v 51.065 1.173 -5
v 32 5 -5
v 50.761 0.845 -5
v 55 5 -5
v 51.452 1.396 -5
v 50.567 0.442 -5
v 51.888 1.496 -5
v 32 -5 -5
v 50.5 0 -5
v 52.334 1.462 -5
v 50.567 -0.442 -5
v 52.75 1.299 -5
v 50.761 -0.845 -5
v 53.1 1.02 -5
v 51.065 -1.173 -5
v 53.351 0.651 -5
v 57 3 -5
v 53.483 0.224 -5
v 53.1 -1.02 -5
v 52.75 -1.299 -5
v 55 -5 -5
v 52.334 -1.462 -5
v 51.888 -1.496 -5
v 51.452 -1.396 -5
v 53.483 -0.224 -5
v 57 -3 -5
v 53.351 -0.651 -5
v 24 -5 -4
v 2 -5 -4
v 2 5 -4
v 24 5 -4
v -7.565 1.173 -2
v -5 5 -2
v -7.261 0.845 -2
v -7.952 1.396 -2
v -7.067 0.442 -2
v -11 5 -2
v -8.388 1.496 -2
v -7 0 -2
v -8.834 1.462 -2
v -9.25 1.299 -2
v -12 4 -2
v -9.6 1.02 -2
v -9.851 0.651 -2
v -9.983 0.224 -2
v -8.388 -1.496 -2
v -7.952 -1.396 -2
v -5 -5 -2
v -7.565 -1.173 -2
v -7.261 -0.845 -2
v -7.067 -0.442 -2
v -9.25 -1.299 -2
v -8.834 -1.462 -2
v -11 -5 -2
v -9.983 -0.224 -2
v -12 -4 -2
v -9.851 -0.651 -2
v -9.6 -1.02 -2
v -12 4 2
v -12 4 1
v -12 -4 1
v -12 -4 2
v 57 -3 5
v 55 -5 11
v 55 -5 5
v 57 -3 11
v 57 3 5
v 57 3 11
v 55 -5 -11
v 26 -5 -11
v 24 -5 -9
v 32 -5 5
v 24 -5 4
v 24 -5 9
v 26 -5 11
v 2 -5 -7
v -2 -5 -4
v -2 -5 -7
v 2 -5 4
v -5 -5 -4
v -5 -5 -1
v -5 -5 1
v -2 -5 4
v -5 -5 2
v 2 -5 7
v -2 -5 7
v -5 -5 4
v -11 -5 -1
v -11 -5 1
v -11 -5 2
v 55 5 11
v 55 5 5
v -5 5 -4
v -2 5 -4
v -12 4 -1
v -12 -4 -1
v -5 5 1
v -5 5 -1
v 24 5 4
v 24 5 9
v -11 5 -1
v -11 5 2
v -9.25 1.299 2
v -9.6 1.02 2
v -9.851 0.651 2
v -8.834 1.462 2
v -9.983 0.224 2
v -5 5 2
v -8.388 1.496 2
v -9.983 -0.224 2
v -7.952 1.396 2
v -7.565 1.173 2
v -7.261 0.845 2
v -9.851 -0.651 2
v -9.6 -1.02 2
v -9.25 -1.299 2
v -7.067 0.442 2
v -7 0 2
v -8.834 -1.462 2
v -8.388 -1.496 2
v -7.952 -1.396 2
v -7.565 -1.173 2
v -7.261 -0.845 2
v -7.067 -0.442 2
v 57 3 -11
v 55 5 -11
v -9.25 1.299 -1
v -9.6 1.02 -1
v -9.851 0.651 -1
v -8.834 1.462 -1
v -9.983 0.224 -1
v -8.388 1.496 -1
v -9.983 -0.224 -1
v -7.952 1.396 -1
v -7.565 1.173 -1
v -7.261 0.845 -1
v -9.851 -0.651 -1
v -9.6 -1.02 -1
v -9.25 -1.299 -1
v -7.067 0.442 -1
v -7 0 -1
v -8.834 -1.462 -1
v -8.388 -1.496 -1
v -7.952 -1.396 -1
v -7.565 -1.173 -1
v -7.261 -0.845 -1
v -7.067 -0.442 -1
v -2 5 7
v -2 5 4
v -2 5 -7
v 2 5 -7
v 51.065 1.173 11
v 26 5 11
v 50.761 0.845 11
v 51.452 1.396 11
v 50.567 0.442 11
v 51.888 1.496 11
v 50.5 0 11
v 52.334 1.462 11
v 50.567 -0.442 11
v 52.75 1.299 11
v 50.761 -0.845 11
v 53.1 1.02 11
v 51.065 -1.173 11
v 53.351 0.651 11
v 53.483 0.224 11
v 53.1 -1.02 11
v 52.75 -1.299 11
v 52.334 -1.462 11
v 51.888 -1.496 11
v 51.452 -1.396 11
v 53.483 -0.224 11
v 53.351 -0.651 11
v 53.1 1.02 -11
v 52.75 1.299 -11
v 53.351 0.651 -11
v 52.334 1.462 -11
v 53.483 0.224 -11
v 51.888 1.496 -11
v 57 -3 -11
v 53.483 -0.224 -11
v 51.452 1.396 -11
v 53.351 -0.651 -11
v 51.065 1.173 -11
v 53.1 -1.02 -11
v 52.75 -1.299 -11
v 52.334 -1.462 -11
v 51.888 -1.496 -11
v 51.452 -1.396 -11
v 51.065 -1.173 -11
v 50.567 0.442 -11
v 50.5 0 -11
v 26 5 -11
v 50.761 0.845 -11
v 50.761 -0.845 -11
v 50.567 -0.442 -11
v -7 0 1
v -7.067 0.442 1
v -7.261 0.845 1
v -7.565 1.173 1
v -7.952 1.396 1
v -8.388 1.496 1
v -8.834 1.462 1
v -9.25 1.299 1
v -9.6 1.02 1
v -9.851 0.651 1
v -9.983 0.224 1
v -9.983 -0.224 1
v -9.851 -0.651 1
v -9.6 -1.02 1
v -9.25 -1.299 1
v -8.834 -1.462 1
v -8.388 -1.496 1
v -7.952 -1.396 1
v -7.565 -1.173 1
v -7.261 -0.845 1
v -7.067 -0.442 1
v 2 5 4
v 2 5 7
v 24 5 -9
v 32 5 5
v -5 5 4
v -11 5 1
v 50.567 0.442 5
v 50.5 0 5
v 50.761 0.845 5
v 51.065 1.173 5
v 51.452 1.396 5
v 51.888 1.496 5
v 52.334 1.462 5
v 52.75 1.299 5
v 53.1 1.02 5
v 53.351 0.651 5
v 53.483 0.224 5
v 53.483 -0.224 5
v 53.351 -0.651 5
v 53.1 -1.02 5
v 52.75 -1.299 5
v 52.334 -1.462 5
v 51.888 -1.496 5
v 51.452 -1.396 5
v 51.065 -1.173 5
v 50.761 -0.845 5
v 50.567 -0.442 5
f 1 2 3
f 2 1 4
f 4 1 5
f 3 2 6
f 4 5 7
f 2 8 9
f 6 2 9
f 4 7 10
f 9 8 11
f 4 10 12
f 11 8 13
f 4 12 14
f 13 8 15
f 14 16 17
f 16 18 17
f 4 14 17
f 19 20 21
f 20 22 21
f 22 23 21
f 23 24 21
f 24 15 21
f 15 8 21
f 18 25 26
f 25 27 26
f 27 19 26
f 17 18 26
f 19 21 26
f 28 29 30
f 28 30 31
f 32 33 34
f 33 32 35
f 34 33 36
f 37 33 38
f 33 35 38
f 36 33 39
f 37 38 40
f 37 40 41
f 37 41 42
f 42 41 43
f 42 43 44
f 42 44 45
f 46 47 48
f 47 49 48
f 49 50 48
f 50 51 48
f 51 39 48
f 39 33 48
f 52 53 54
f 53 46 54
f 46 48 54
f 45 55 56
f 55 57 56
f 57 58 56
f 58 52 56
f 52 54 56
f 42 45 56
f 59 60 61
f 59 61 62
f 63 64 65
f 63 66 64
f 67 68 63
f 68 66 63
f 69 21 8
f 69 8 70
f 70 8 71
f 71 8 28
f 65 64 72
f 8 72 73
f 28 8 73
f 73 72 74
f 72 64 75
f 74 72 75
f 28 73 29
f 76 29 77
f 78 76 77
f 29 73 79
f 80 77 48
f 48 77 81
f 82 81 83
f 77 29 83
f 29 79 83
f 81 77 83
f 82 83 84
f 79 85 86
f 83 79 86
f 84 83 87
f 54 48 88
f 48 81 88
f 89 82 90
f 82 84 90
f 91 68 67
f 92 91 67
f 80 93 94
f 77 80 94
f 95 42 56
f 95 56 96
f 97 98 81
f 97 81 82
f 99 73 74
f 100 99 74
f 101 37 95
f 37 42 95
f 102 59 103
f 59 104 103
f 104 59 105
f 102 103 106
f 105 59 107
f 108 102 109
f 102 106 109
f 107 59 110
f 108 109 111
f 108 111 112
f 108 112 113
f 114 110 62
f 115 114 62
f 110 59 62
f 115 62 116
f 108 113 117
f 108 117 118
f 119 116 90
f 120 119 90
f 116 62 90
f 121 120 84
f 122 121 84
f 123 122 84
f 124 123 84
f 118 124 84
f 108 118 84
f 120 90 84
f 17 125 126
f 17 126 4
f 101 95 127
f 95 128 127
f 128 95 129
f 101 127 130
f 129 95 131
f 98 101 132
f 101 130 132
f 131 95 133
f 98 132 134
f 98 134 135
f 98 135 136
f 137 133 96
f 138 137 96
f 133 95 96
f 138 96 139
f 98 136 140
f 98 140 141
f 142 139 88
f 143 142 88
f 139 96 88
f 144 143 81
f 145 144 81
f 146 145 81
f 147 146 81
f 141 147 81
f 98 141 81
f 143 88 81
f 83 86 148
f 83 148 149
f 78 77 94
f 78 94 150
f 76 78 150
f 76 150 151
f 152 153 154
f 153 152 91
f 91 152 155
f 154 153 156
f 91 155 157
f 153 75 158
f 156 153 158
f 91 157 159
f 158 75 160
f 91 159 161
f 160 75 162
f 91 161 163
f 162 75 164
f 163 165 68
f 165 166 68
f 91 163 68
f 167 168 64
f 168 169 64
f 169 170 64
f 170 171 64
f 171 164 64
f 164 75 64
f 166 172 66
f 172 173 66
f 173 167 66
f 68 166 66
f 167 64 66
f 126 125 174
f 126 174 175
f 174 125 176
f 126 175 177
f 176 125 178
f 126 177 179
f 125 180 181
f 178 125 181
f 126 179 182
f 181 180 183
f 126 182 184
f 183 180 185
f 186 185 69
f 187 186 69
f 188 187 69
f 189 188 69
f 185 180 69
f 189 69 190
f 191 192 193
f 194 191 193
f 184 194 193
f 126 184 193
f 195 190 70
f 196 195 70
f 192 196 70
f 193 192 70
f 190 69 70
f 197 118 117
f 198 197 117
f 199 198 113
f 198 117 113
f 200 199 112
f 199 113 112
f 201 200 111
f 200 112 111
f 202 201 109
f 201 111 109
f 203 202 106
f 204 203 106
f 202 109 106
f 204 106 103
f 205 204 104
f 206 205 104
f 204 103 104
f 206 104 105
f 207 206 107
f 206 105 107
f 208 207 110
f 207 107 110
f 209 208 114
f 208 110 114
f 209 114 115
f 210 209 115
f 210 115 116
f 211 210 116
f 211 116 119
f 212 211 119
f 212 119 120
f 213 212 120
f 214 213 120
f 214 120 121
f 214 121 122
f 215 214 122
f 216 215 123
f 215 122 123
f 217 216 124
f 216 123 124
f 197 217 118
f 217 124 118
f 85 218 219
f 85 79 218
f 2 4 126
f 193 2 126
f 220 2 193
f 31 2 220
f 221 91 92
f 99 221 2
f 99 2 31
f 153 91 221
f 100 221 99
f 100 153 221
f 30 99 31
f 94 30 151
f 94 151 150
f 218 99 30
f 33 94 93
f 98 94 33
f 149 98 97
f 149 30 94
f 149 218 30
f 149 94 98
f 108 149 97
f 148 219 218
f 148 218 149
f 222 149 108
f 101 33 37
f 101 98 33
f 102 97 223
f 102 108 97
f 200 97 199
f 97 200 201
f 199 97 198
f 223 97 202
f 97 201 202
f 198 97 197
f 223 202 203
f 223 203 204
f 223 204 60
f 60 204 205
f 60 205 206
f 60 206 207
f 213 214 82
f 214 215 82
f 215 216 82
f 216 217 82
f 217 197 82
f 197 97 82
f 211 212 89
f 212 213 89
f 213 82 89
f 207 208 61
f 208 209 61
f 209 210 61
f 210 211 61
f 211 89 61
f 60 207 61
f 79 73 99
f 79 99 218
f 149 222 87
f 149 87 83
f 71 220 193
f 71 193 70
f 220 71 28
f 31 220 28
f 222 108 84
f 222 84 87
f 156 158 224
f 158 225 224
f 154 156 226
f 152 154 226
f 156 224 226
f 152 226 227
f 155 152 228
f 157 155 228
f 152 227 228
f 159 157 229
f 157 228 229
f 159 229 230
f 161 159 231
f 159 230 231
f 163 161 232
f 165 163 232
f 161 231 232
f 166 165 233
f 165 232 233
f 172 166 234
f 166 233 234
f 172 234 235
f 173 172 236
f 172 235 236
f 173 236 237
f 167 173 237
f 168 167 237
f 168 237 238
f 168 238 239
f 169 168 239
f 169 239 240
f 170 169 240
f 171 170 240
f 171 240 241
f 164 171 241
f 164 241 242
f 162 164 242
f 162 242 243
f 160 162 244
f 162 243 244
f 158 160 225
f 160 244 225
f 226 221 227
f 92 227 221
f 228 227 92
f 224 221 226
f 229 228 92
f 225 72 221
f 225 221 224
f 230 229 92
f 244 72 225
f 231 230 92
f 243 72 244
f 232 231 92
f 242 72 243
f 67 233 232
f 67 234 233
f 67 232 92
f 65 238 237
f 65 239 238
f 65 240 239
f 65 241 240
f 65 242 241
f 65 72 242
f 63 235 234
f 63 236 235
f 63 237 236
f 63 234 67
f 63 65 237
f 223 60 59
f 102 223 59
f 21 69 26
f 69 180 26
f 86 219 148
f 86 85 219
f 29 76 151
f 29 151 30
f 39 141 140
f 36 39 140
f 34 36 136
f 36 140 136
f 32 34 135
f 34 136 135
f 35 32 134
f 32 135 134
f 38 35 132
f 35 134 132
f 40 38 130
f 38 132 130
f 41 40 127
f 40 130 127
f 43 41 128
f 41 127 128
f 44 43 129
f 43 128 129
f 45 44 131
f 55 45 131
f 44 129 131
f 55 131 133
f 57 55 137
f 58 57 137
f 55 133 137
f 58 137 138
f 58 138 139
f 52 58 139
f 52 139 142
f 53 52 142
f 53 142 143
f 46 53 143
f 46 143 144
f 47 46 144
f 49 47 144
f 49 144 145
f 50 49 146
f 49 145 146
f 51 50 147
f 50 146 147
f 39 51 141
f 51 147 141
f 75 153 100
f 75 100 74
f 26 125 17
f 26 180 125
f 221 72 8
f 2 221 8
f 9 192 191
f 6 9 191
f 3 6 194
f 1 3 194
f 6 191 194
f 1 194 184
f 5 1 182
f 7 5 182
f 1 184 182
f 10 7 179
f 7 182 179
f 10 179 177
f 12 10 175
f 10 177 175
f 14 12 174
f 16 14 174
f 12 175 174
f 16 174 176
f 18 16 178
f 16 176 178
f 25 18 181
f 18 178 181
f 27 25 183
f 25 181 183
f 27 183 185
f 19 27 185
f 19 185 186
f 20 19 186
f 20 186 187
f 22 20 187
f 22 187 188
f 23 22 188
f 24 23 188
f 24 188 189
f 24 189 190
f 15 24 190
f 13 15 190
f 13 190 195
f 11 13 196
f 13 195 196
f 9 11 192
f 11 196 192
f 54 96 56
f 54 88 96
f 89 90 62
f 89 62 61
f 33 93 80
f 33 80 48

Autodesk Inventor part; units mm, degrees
ref_plane "YZ Plane" through (0, 0, 0) normal (1, 0, 0) x (0, 1, 0)
ref_plane "XZ Plane" through (0, 0, 0) normal (0, 1, 0) x (-1, 0, 0)
ref_plane "Work Plane1" through (0, 0, -10) normal (0, 0, 1) x (1, 0, 0)
sketch "Sketch12" plane through (0, 0, 0) normal (0, 1, 0) x (-1, 0, 0)
  line L0 (5, 4) -> (2, 4)
  line L1 (-2, 4) -> (-2, 7)
  line L2 (-2, 7) -> (2, 7)
  line L3 (2, 7) -> (2, 4)
  line L4 (6, 1) -> (12, 1)
  line L5 (12, -1) -> (6, -1)
  line L6 (12, -1) -> (6, -1)
  line L7 (6, -2) -> (12, -2)
  line L8 (5, -4) -> (5, 4)
  line L9 (12, -2) -> (12, -1)
  line L10 (12, 1) -> (12, 2)
  line L11 (12, 2) -> (6, 2)
  line L12 (6, -2) -> (5, -2)
  line L13 (6, -1) -> (5, -1)
  line L14 (6, 1) -> (5, 1)
  line L15 (6, 2) -> (5, 2)
  line L16 (-31, -11) -> (-57, -11)
  line L17 (-57, -11) -> (-57, -5)
  line L18 (-31, 11) -> (-57, 11)
  line L19 (-57, 11) -> (-57, 5)
  line L20 (-31, -11) -> (-24, -11)
  line L21 (-24, -11) -> (-24, -4)
  line L22 (-24, -4) -> (-24, 11)
  line L23 (-24, 11) -> (-31, 11)
  line L24 (-32, -4) -> (-32, 4)
  line L25 (-32, 4) -> (-32, 5)
  line L26 (-32, 5) -> (-57, 5)
  line L27 (-32, -4) -> (-32, -5)
  line L28 (-32, -5) -> (-57, -5)
  line L29 (5, -4) -> (2, -4)
  line L30 (2, -4) -> (2, -7)
  line L31 (2, -7) -> (-2, -7)
  line L32 (-2, -7) -> (-2, -4)
  line L33 (-2, -4) -> (-5, -4)
  line L34 (-5, -4) -> (-5, 4)
  line L35 (-5, 4) -> (-2, 4)
  line L36 (-5, 4) -> (-24, 4)
  line L37 (-5, -4) -> (-24, -4)
  point P0 (0, 0)
  point P1 (-31, 4)
  dimension "d118" = 4
  dimension "d156" = 7
  dimension "d170" = 3
  dimension "d171" = 3
ref_plane "Work Plane3" through (-12, 0, 2) normal (0, 0, 1) x (1, 0, 0)
extrude "Extrusion16" add sketch "Sketch12" along normal mid plane 10
extrude "Extrusion17" add sketch "Sketch12" along normal mid plane 8 contours L15 L11 L10 L4 L14 L8 | L13 L5 L9 L7 L12 L8
sketch "Sketch17" plane through (-12, 4, 2) normal (0, 0, 1) x (1, 0, 0)
  line L0 (7, -9) -> (7, 1) projected
  line L1 (7, -8) -> (3.5, -8)
  line L2 (0, -8) -> (7, -8) projected
  circle A0 centre (3.5, -4) radius 1.5
  point P0 (12, -4)
  point P1 (7, 0)
  dimension "d173" = 3
extrude "Extrusion18" cut sketch "Sketch17" against normal through all
extrude "Extrusion19" add sketch "Sketch12" along normal mid plane 6 contours L22 L21 L20 L16 L17 L28 L27 L24 L25 L26 L19 L18 L23
sketch "Sketch18" plane through (57, 3, -11) normal (0, 0, -1) x (-1, 0, 0)
  line L0 (0, -6) -> (0, 0) projected
  circle A0 centre (5, -3) radius 1.5
  point P0 (57, -3)
  dimension "d162" = 3
extrude "Extrusion20" cut sketch "Sketch18" against normal through all
chamfer "Chamfer12" distance 2 angle 45 6 edges at (57, 5, 8) (57, -5, 8) (57, 5, -8) (57, -5, -8) (24, 0, 11) (24, 0, -11)
chamfer "Chamfer13" distance 1 angle 45 4 edges at (-12, 5, 1.5) (-12, -5, 1.5) (-12, -5, -1.5) (-12, 5, -1.5)
properties part number "finger"
